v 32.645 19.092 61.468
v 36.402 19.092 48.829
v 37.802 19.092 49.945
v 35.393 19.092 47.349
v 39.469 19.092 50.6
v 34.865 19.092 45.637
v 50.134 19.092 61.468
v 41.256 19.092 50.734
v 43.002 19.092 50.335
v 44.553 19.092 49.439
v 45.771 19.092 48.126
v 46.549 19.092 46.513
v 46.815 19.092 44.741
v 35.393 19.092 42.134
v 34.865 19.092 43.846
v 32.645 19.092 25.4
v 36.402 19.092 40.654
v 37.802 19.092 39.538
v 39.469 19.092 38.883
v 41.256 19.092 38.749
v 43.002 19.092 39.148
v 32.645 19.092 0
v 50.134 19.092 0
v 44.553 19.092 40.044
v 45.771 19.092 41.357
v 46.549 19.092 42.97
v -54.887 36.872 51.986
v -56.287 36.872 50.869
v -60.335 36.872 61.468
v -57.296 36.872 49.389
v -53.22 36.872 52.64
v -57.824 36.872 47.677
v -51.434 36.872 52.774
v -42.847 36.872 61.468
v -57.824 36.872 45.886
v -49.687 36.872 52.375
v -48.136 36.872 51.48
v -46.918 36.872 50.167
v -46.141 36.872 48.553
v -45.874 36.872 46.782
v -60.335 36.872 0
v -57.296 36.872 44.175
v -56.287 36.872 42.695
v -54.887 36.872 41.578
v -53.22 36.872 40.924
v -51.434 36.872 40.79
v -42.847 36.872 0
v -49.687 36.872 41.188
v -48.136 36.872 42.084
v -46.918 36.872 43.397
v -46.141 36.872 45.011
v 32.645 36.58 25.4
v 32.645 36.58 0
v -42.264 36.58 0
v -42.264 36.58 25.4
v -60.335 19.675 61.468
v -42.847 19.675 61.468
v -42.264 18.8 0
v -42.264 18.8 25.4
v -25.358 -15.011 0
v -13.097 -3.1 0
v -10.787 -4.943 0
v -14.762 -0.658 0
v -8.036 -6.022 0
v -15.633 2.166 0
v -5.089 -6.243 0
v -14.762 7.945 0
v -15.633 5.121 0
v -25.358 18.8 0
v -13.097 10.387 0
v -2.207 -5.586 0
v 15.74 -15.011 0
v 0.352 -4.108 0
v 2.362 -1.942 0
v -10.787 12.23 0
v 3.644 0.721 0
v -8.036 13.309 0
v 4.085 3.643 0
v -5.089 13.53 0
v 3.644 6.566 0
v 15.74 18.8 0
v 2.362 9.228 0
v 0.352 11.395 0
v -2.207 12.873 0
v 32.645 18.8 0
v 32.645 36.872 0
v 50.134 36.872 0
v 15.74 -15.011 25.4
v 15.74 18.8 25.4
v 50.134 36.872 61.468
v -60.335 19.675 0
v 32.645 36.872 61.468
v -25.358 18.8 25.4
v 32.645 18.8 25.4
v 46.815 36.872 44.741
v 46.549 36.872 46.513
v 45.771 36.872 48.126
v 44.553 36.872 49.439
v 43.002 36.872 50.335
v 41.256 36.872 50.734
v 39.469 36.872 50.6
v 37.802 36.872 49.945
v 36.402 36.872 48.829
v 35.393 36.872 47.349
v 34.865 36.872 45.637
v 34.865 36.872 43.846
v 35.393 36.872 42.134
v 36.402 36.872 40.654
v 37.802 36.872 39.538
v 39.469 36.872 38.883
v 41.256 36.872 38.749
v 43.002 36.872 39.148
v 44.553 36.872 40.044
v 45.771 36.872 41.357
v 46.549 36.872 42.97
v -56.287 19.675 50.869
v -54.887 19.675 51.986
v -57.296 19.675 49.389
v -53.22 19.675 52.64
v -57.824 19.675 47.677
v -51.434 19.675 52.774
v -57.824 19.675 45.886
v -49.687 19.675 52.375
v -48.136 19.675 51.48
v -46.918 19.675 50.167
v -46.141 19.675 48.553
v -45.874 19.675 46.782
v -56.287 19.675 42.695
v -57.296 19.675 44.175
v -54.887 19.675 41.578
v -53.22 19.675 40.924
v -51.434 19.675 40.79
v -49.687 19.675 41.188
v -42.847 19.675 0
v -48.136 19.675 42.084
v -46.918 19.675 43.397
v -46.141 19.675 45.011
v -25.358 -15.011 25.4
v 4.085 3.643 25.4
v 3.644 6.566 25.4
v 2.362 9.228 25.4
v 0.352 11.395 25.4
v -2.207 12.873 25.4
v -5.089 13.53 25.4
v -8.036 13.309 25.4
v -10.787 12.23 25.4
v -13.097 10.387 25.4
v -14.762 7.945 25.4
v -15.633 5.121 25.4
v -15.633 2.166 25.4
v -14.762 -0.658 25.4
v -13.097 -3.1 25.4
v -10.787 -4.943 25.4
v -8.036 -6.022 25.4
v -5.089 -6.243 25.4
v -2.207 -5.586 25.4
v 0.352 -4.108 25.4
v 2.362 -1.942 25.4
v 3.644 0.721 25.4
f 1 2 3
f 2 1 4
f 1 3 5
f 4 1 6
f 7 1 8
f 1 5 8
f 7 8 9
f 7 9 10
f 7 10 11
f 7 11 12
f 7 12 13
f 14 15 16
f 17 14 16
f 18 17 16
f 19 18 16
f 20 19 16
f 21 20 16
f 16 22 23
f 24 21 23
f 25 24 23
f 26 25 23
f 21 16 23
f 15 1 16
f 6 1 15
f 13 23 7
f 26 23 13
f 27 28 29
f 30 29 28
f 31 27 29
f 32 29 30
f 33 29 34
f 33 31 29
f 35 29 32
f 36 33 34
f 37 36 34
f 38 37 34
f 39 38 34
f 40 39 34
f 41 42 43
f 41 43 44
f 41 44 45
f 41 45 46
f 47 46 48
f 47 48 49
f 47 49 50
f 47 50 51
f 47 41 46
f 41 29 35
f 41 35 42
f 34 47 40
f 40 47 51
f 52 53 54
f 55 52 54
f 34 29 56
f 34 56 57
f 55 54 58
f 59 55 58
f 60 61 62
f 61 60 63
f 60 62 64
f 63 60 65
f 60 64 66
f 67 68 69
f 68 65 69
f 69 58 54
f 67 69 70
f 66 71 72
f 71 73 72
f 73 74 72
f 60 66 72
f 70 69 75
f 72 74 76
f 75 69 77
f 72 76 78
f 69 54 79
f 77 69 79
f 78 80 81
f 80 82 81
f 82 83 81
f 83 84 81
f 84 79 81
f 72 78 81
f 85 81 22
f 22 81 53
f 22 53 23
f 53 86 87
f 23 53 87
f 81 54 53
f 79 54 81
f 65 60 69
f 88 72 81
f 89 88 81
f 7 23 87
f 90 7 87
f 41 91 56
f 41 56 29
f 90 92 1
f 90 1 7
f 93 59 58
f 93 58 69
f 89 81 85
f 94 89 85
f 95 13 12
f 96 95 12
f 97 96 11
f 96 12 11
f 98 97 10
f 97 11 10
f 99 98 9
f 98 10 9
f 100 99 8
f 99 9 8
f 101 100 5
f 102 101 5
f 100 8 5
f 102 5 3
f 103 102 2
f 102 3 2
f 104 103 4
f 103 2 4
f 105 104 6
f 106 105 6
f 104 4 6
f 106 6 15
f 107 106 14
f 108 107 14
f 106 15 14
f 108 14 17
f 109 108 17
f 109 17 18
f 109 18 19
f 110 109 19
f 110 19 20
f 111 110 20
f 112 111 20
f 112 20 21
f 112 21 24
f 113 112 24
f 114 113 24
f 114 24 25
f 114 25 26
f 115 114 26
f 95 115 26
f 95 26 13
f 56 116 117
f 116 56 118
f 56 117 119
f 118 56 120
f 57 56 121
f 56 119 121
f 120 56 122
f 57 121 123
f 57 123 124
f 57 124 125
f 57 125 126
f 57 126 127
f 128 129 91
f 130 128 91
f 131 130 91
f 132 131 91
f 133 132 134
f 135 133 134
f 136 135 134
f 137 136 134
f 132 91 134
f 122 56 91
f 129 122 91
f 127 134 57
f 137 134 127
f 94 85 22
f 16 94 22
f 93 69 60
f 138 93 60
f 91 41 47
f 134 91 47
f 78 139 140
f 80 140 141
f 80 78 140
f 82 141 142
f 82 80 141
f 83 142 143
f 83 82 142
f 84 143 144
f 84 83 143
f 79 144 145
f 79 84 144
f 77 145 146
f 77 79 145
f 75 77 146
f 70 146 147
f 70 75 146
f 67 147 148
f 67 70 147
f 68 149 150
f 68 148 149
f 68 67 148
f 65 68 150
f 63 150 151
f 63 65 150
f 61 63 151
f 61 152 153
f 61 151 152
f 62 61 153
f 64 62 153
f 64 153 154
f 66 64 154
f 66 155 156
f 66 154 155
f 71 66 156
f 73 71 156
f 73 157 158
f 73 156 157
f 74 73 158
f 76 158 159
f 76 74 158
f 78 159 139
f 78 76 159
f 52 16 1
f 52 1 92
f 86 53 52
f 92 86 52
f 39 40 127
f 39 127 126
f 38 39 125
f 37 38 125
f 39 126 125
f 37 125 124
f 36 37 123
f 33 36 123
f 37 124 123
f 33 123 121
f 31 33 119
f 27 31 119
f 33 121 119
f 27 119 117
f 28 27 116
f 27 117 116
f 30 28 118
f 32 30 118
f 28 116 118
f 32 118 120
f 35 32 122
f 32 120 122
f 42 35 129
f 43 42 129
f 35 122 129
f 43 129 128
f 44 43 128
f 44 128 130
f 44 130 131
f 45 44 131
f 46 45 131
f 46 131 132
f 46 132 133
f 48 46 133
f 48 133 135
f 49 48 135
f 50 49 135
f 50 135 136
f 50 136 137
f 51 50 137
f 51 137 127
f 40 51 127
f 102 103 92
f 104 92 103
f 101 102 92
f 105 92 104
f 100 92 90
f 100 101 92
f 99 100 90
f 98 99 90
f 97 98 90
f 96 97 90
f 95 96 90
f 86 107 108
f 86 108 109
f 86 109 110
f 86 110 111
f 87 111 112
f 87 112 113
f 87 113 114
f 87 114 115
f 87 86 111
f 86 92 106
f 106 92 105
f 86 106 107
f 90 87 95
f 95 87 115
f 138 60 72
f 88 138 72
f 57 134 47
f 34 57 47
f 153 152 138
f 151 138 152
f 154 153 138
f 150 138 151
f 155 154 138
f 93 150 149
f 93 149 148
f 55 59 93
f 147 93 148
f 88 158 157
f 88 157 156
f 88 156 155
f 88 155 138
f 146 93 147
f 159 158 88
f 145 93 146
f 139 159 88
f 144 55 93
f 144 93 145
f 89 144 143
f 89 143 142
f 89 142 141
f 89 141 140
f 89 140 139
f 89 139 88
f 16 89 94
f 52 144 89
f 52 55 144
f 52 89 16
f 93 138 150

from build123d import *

# Parameters (mm, degrees)
F1_DEPTH  = 25.4
F2_W      = 17.488524
F2_H      = 17.780002
F2_W_2    = 17.488528
F2_H_2    = 17.19705
F3_DEPTH  = 61.468
F4_R      = 9.91445
F5_DEPTH  = 47.752
F6_R      = 4.653426
F7_DEPTH  = 54.864
F8_R      = 6.008917
F9_DEPTH  = 49.784
F10_R     = 6.008916
F11_DEPTH = 51.054


with BuildPart() as f1:
    # F0 (on Top) → F1 (new body)
    with BuildSketch(Plane.XY):
        Polygon((-42.263936, 18.800164), (-25.35836, 18.800164), (-25.35836, -15.010984), (15.739674, -15.010984), (15.739674, 18.800176), (32.645253, 18.800176), (32.645253, 36.580164), (-42.263936, 36.580164), align=None)
    extrude(amount=F1_DEPTH)

    # F2 (on Top) → F3 (join)
    with BuildSketch(Plane.XY):
        with Locations((41.389506, 27.981641)):
            Rectangle(F2_W, F2_H)
        with Locations((-51.591149, 28.273117)):
            Rectangle(F2_W_2, F2_H_2)
    extrude(amount=F3_DEPTH)

    # F4 (on Top) → F5 (cut)
    with BuildSketch(Plane.XY):
        with Locations((-5.829508, 3.643443)):
            Circle(F4_R)
    extrude(amount=F5_DEPTH, mode=Mode.SUBTRACT)

    # F6 (on Front) → F7 (cut)
    with BuildSketch(Plane.XZ):
        with Locations((26.7267, 51.102538)):
            Circle(F6_R)
    extrude(amount=-F7_DEPTH, mode=Mode.SUBTRACT)

    # F8 (on face) → F9 (cut)
    with BuildSketch(Plane.XZ.offset(-19.674592)):
        with Locations((-51.882625, 46.781804)):
            Circle(F8_R)
    extrude(amount=-F9_DEPTH, mode=Mode.SUBTRACT)

    # F10 (on Front) → F11 (cut)
    with BuildSketch(Plane.XZ):
        with Locations((40.806558, 44.741478)):
            Circle(F10_R)
    extrude(amount=-F11_DEPTH, mode=Mode.SUBTRACT)


solid = f1.part
